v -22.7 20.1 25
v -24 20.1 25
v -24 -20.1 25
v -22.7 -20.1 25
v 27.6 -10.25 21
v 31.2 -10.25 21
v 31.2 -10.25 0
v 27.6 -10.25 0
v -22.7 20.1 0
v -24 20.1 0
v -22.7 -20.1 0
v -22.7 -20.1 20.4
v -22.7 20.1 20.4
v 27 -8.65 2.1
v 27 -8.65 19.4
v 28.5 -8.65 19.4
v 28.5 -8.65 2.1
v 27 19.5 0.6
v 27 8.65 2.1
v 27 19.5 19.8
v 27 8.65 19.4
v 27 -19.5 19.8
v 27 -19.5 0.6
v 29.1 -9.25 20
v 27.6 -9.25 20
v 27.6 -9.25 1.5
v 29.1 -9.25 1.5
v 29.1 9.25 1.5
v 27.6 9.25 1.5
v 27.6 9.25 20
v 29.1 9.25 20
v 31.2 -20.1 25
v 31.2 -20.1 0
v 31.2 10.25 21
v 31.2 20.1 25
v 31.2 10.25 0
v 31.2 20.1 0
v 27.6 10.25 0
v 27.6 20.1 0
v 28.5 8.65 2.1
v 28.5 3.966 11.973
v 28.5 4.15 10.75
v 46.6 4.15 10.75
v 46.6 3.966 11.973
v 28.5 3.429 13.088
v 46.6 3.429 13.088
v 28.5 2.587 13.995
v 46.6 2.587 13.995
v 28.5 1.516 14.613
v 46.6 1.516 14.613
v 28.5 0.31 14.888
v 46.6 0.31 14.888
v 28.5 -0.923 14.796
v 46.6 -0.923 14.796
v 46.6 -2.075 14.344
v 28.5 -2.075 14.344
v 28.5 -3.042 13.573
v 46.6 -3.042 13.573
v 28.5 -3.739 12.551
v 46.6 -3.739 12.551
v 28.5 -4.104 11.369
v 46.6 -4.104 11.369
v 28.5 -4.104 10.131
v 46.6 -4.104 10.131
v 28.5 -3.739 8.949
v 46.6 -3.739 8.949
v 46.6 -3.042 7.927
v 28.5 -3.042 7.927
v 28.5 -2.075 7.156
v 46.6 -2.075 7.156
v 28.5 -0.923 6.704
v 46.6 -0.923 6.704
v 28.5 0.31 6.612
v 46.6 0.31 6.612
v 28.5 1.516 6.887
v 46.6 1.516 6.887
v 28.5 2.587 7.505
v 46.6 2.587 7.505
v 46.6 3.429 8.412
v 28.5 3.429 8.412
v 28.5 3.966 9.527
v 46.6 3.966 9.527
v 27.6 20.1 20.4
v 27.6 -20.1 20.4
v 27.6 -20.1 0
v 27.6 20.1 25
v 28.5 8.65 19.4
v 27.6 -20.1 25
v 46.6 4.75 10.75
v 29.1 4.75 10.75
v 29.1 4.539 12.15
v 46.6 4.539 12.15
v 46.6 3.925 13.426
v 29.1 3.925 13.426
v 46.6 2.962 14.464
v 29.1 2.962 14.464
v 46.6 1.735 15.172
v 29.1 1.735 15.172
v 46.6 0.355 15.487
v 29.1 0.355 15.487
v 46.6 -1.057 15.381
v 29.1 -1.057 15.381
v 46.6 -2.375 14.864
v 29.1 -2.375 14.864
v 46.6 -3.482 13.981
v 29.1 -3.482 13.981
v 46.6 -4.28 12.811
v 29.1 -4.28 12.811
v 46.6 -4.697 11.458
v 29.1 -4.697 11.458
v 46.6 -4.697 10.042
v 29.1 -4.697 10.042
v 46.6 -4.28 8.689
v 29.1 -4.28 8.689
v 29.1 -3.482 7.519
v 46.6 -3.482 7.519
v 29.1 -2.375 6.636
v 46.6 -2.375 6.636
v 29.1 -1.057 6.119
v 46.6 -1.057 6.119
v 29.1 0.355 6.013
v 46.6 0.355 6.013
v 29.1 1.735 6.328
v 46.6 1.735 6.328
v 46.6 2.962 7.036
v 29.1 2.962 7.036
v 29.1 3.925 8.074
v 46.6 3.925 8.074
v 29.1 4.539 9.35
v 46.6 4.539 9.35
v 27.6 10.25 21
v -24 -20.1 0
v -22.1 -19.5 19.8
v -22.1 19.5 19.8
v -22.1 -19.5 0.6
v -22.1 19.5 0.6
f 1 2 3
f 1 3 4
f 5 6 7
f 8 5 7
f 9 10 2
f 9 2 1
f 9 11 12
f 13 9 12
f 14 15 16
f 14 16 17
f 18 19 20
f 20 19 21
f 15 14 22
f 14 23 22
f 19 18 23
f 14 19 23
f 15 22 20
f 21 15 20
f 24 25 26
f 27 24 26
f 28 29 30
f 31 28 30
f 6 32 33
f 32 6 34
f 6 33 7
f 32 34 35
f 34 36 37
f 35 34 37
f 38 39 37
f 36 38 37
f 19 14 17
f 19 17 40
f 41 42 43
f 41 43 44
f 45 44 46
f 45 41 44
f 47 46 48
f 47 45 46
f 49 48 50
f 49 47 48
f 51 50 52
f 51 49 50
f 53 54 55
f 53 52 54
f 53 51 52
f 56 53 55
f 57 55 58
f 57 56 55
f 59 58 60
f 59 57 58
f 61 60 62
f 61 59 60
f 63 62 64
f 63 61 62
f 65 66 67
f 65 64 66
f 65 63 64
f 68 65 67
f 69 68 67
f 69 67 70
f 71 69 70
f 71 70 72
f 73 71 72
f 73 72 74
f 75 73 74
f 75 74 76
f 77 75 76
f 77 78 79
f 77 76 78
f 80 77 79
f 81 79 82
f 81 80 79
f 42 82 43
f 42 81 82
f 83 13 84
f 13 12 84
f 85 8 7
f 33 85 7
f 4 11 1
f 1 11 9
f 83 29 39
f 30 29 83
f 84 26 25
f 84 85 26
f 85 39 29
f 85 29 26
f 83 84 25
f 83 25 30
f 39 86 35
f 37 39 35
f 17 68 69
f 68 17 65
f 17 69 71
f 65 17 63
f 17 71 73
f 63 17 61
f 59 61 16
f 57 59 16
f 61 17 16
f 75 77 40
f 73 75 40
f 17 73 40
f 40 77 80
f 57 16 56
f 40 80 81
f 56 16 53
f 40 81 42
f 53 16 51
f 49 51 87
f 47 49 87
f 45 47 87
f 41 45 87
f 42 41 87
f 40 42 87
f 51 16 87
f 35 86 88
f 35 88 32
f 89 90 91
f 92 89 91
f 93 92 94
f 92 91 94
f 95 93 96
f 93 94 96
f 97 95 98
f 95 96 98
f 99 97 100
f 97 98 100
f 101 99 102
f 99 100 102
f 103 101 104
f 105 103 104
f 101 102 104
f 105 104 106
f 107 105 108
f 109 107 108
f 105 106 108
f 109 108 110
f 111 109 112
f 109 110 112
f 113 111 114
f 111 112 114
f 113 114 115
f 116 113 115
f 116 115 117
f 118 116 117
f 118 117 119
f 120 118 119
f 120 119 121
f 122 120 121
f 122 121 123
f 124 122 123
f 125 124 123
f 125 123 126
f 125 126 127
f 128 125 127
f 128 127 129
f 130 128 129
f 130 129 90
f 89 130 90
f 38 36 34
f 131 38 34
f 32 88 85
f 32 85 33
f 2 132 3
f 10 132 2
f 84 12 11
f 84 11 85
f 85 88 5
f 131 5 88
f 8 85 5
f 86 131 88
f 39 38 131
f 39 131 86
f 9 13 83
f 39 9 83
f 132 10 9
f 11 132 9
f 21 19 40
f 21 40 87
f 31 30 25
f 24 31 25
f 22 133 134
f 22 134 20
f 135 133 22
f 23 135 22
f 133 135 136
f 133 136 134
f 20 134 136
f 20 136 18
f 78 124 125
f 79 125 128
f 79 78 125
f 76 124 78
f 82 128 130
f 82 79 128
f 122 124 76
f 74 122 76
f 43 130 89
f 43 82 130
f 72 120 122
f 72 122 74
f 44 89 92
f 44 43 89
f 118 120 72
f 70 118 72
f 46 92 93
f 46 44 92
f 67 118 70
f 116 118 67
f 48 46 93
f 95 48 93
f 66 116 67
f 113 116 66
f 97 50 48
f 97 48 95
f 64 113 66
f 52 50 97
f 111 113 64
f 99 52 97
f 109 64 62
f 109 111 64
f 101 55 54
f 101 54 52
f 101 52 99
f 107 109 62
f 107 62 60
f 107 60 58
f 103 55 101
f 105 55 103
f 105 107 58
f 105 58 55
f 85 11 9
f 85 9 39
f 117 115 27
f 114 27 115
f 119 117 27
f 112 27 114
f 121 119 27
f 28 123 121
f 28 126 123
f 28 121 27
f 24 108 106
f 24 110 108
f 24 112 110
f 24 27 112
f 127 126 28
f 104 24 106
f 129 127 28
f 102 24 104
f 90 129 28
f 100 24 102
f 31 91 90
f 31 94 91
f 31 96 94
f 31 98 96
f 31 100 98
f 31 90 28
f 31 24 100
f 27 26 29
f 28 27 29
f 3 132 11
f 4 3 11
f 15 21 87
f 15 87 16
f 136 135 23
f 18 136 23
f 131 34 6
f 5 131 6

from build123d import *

# Parameters (mm, degrees)
F0_W     = 50.3
F0_H     = 20.4
F1_DEPTH = 20.1
F2_R     = 4.75
F3_DEPTH = 1.5
F4_DEPTH = 19
F5_T     = -0.6
F6_W     = 3.6
F6_H     = 40.2
F7_DEPTH = 25
F6_W_2   = 1.3
F9_DEPTH = 3.6


# Not quite as in the source:
# - a feature of the source that left no trace in its solid (it failed there, or was rolled back) is left out


with BuildPart() as f1:
    # F0 (on Front) → F1 (new body, symmetric)
    with BuildSketch(Plane.XZ):
        with Locations((2.45, 10.2)):
            Rectangle(F0_W, F0_H)
    extrude(amount=F1_DEPTH, both=True)

    # F2 (on face) → F3 (join)
    with BuildSketch(Plane.YZ.offset(27.6)):
        Polygon((-9.25, 20), (-9.25, 1.5), (0, 1.5), (9.25, 1.5), (9.25, 20), (0, 20), align=None)
        with Locations((0, 10.75)):
            Circle(F2_R, mode=Mode.SUBTRACT)
    extrude(amount=F3_DEPTH)

    # F4 (add): a face of the model
    f4_faces = [f1.faces().sort_by_distance(p)[0] for p in [
        (27.6, 0, 10.75),
    ]]
    extrude(f4_faces, amount=F4_DEPTH)

    # F5
    f5_openings = [f1.faces().sort_by_distance(p)[0] for p in [
        (46.6, 0, 10.75),
    ]]
    offset(amount=F5_T, openings=f5_openings, kind=Kind.INTERSECTION)


with BuildPart() as f7:
    # F6 (on Top) → F7 (new body)
    with BuildSketch(Plane.XY):
        with Locations((29.4, 0)):
            Rectangle(F6_W, F6_H)
    extrude(amount=F7_DEPTH)

    # F8 (on face) → F9 (cut, through all)
    with BuildSketch(Plane.YZ.offset(31.2)):
        with BuildLine():
            Line((-9.25, 0), (-9.25, 16.108633541))
            ThreePointArc((-9.25, 16.108633541), (-9.7456992731, 16.015473058), (-10.25, 16.0066740906))
            Line((-10.25, 16.0066740906), (-10.25, 0))
            Line((-10.25, 0), (-9.25, 0))
        make_face()
        with BuildLine():
            Line((-9.25, 16.108633541), (-9.25, 20))
            Line((-9.25, 20), (-7.2215728753, 20))
            ThreePointArc((-7.2215728753, 20), (-7.4688611699, 20.5289611963), (-7.8139320225, 21))
            Line((-7.8139320225, 21), (-10.25, 21))
            Line((-10.25, 21), (-10.25, 16.0066740906))
            ThreePointArc((-10.25, 16.0066740906), (-9.7456992731, 16.015473058), (-9.25, 16.108633541))
        make_face()
        with BuildLine():
            ThreePointArc((-7.8139320225, 21), (-7.4688611699, 20.5289611963), (-7.2215728753, 20))
            Line((-7.2215728753, 20), (-2.8284271247, 20))
            ThreePointArc((-2.8284271247, 20), (-2.5811388301, 20.5289611963), (-2.2360679775, 21))
            Line((-2.2360679775, 21), (-7.8139320225, 21))
        make_face()
        with BuildLine():
            Line((-2.8284271247, 20), (-7.2215728753, 20))
            ThreePointArc((-7.2215728753, 20), (-7.093204321, 19.5073059362), (-7.05, 19))
            ThreePointArc((-7.05, 19), (-7.6625327227, 17.1834097875), (-9.25, 16.108633541))
            Line((-9.25, 16.108633541), (-9.25, 0))
            Line((-9.25, 0), (9.25, 0))
            Line((9.25, 0), (9.25, 16.108633541))
            ThreePointArc((9.25, 16.108633541), (7.3897266908, 17.6132967438), (7.2215728753, 20))
            Line((7.2215728753, 20), (2.8284271247, 20))
            ThreePointArc((2.8284271247, 20), (2.956795679, 19.5073059362), (3, 19))
            ThreePointArc((3, 19), (-0.5073059362, 16.043204321), (-2.8284271247, 20))
        make_face()
        with BuildLine():
            Line((9.25, 20), (7.2215728753, 20))
            ThreePointArc((7.2215728753, 20), (7.3897266908, 17.6132967438), (9.25, 16.108633541))
            Line((9.25, 16.108633541), (9.25, 20))
        make_face()
        with BuildLine():
            Line((2.8284271247, 20), (-2.8284271247, 20))
            ThreePointArc((-2.8284271247, 20), (-0.5073059362, 16.043204321), (3, 19))
            ThreePointArc((3, 19), (2.956795679, 19.5073059362), (2.8284271247, 20))
        make_face()
        with BuildLine():
            Line((-7.2215728753, 20), (-9.25, 20))
            Line((-9.25, 20), (-9.25, 16.108633541))
            ThreePointArc((-9.25, 16.108633541), (-7.6625327227, 17.1834097875), (-7.05, 19))
            ThreePointArc((-7.05, 19), (-7.093204321, 19.5073059362), (-7.2215728753, 20))
        make_face()
        with BuildLine():
            Line((9.25, 16.108633541), (9.25, 0))
            Line((9.25, 0), (10.25, 0))
            Line((10.25, 0), (10.25, 16.0066740906))
            ThreePointArc((10.25, 16.0066740906), (9.7456992731, 16.015473058), (9.25, 16.108633541))
        make_face()
        with BuildLine():
            ThreePointArc((7.8139320225, 21), (7.4688611699, 20.5289611963), (7.2215728753, 20))
            Line((7.2215728753, 20), (9.25, 20))
            Line((9.25, 20), (9.25, 16.108633541))
            ThreePointArc((9.25, 16.108633541), (9.7456992731, 16.015473058), (10.25, 16.0066740906))
            Line((10.25, 16.0066740906), (10.25, 21))
            Line((10.25, 21), (7.8139320225, 21))
        make_face()
        with BuildLine():
            ThreePointArc((2.2360679775, 21), (2.5811388301, 20.5289611963), (2.8284271247, 20))
            Line((2.8284271247, 20), (7.2215728753, 20))
            ThreePointArc((7.2215728753, 20), (7.4688611699, 20.5289611963), (7.8139320225, 21))
            Line((7.8139320225, 21), (2.2360679775, 21))
        make_face()
        with BuildLine():
            ThreePointArc((-2.2360679775, 21), (-2.5811388301, 20.5289611963), (-2.8284271247, 20))
            Line((-2.8284271247, 20), (2.8284271247, 20))
            ThreePointArc((2.8284271247, 20), (2.5811388301, 20.5289611963), (2.2360679775, 21))
            Line((2.2360679775, 21), (-2.2360679775, 21))
        make_face()
    extrude(amount=-F9_DEPTH, mode=Mode.SUBTRACT)


with BuildPart() as f7b:
    # F6 (on Top) → F7, piece 2 (new body)
    with BuildSketch(Plane.XY):
        with Locations((-23.35, 0)):
            Rectangle(F6_W_2, F6_H)
    extrude(amount=F7_DEPTH)


solid = Compound([f1.part, f7.part, f7b.part])
